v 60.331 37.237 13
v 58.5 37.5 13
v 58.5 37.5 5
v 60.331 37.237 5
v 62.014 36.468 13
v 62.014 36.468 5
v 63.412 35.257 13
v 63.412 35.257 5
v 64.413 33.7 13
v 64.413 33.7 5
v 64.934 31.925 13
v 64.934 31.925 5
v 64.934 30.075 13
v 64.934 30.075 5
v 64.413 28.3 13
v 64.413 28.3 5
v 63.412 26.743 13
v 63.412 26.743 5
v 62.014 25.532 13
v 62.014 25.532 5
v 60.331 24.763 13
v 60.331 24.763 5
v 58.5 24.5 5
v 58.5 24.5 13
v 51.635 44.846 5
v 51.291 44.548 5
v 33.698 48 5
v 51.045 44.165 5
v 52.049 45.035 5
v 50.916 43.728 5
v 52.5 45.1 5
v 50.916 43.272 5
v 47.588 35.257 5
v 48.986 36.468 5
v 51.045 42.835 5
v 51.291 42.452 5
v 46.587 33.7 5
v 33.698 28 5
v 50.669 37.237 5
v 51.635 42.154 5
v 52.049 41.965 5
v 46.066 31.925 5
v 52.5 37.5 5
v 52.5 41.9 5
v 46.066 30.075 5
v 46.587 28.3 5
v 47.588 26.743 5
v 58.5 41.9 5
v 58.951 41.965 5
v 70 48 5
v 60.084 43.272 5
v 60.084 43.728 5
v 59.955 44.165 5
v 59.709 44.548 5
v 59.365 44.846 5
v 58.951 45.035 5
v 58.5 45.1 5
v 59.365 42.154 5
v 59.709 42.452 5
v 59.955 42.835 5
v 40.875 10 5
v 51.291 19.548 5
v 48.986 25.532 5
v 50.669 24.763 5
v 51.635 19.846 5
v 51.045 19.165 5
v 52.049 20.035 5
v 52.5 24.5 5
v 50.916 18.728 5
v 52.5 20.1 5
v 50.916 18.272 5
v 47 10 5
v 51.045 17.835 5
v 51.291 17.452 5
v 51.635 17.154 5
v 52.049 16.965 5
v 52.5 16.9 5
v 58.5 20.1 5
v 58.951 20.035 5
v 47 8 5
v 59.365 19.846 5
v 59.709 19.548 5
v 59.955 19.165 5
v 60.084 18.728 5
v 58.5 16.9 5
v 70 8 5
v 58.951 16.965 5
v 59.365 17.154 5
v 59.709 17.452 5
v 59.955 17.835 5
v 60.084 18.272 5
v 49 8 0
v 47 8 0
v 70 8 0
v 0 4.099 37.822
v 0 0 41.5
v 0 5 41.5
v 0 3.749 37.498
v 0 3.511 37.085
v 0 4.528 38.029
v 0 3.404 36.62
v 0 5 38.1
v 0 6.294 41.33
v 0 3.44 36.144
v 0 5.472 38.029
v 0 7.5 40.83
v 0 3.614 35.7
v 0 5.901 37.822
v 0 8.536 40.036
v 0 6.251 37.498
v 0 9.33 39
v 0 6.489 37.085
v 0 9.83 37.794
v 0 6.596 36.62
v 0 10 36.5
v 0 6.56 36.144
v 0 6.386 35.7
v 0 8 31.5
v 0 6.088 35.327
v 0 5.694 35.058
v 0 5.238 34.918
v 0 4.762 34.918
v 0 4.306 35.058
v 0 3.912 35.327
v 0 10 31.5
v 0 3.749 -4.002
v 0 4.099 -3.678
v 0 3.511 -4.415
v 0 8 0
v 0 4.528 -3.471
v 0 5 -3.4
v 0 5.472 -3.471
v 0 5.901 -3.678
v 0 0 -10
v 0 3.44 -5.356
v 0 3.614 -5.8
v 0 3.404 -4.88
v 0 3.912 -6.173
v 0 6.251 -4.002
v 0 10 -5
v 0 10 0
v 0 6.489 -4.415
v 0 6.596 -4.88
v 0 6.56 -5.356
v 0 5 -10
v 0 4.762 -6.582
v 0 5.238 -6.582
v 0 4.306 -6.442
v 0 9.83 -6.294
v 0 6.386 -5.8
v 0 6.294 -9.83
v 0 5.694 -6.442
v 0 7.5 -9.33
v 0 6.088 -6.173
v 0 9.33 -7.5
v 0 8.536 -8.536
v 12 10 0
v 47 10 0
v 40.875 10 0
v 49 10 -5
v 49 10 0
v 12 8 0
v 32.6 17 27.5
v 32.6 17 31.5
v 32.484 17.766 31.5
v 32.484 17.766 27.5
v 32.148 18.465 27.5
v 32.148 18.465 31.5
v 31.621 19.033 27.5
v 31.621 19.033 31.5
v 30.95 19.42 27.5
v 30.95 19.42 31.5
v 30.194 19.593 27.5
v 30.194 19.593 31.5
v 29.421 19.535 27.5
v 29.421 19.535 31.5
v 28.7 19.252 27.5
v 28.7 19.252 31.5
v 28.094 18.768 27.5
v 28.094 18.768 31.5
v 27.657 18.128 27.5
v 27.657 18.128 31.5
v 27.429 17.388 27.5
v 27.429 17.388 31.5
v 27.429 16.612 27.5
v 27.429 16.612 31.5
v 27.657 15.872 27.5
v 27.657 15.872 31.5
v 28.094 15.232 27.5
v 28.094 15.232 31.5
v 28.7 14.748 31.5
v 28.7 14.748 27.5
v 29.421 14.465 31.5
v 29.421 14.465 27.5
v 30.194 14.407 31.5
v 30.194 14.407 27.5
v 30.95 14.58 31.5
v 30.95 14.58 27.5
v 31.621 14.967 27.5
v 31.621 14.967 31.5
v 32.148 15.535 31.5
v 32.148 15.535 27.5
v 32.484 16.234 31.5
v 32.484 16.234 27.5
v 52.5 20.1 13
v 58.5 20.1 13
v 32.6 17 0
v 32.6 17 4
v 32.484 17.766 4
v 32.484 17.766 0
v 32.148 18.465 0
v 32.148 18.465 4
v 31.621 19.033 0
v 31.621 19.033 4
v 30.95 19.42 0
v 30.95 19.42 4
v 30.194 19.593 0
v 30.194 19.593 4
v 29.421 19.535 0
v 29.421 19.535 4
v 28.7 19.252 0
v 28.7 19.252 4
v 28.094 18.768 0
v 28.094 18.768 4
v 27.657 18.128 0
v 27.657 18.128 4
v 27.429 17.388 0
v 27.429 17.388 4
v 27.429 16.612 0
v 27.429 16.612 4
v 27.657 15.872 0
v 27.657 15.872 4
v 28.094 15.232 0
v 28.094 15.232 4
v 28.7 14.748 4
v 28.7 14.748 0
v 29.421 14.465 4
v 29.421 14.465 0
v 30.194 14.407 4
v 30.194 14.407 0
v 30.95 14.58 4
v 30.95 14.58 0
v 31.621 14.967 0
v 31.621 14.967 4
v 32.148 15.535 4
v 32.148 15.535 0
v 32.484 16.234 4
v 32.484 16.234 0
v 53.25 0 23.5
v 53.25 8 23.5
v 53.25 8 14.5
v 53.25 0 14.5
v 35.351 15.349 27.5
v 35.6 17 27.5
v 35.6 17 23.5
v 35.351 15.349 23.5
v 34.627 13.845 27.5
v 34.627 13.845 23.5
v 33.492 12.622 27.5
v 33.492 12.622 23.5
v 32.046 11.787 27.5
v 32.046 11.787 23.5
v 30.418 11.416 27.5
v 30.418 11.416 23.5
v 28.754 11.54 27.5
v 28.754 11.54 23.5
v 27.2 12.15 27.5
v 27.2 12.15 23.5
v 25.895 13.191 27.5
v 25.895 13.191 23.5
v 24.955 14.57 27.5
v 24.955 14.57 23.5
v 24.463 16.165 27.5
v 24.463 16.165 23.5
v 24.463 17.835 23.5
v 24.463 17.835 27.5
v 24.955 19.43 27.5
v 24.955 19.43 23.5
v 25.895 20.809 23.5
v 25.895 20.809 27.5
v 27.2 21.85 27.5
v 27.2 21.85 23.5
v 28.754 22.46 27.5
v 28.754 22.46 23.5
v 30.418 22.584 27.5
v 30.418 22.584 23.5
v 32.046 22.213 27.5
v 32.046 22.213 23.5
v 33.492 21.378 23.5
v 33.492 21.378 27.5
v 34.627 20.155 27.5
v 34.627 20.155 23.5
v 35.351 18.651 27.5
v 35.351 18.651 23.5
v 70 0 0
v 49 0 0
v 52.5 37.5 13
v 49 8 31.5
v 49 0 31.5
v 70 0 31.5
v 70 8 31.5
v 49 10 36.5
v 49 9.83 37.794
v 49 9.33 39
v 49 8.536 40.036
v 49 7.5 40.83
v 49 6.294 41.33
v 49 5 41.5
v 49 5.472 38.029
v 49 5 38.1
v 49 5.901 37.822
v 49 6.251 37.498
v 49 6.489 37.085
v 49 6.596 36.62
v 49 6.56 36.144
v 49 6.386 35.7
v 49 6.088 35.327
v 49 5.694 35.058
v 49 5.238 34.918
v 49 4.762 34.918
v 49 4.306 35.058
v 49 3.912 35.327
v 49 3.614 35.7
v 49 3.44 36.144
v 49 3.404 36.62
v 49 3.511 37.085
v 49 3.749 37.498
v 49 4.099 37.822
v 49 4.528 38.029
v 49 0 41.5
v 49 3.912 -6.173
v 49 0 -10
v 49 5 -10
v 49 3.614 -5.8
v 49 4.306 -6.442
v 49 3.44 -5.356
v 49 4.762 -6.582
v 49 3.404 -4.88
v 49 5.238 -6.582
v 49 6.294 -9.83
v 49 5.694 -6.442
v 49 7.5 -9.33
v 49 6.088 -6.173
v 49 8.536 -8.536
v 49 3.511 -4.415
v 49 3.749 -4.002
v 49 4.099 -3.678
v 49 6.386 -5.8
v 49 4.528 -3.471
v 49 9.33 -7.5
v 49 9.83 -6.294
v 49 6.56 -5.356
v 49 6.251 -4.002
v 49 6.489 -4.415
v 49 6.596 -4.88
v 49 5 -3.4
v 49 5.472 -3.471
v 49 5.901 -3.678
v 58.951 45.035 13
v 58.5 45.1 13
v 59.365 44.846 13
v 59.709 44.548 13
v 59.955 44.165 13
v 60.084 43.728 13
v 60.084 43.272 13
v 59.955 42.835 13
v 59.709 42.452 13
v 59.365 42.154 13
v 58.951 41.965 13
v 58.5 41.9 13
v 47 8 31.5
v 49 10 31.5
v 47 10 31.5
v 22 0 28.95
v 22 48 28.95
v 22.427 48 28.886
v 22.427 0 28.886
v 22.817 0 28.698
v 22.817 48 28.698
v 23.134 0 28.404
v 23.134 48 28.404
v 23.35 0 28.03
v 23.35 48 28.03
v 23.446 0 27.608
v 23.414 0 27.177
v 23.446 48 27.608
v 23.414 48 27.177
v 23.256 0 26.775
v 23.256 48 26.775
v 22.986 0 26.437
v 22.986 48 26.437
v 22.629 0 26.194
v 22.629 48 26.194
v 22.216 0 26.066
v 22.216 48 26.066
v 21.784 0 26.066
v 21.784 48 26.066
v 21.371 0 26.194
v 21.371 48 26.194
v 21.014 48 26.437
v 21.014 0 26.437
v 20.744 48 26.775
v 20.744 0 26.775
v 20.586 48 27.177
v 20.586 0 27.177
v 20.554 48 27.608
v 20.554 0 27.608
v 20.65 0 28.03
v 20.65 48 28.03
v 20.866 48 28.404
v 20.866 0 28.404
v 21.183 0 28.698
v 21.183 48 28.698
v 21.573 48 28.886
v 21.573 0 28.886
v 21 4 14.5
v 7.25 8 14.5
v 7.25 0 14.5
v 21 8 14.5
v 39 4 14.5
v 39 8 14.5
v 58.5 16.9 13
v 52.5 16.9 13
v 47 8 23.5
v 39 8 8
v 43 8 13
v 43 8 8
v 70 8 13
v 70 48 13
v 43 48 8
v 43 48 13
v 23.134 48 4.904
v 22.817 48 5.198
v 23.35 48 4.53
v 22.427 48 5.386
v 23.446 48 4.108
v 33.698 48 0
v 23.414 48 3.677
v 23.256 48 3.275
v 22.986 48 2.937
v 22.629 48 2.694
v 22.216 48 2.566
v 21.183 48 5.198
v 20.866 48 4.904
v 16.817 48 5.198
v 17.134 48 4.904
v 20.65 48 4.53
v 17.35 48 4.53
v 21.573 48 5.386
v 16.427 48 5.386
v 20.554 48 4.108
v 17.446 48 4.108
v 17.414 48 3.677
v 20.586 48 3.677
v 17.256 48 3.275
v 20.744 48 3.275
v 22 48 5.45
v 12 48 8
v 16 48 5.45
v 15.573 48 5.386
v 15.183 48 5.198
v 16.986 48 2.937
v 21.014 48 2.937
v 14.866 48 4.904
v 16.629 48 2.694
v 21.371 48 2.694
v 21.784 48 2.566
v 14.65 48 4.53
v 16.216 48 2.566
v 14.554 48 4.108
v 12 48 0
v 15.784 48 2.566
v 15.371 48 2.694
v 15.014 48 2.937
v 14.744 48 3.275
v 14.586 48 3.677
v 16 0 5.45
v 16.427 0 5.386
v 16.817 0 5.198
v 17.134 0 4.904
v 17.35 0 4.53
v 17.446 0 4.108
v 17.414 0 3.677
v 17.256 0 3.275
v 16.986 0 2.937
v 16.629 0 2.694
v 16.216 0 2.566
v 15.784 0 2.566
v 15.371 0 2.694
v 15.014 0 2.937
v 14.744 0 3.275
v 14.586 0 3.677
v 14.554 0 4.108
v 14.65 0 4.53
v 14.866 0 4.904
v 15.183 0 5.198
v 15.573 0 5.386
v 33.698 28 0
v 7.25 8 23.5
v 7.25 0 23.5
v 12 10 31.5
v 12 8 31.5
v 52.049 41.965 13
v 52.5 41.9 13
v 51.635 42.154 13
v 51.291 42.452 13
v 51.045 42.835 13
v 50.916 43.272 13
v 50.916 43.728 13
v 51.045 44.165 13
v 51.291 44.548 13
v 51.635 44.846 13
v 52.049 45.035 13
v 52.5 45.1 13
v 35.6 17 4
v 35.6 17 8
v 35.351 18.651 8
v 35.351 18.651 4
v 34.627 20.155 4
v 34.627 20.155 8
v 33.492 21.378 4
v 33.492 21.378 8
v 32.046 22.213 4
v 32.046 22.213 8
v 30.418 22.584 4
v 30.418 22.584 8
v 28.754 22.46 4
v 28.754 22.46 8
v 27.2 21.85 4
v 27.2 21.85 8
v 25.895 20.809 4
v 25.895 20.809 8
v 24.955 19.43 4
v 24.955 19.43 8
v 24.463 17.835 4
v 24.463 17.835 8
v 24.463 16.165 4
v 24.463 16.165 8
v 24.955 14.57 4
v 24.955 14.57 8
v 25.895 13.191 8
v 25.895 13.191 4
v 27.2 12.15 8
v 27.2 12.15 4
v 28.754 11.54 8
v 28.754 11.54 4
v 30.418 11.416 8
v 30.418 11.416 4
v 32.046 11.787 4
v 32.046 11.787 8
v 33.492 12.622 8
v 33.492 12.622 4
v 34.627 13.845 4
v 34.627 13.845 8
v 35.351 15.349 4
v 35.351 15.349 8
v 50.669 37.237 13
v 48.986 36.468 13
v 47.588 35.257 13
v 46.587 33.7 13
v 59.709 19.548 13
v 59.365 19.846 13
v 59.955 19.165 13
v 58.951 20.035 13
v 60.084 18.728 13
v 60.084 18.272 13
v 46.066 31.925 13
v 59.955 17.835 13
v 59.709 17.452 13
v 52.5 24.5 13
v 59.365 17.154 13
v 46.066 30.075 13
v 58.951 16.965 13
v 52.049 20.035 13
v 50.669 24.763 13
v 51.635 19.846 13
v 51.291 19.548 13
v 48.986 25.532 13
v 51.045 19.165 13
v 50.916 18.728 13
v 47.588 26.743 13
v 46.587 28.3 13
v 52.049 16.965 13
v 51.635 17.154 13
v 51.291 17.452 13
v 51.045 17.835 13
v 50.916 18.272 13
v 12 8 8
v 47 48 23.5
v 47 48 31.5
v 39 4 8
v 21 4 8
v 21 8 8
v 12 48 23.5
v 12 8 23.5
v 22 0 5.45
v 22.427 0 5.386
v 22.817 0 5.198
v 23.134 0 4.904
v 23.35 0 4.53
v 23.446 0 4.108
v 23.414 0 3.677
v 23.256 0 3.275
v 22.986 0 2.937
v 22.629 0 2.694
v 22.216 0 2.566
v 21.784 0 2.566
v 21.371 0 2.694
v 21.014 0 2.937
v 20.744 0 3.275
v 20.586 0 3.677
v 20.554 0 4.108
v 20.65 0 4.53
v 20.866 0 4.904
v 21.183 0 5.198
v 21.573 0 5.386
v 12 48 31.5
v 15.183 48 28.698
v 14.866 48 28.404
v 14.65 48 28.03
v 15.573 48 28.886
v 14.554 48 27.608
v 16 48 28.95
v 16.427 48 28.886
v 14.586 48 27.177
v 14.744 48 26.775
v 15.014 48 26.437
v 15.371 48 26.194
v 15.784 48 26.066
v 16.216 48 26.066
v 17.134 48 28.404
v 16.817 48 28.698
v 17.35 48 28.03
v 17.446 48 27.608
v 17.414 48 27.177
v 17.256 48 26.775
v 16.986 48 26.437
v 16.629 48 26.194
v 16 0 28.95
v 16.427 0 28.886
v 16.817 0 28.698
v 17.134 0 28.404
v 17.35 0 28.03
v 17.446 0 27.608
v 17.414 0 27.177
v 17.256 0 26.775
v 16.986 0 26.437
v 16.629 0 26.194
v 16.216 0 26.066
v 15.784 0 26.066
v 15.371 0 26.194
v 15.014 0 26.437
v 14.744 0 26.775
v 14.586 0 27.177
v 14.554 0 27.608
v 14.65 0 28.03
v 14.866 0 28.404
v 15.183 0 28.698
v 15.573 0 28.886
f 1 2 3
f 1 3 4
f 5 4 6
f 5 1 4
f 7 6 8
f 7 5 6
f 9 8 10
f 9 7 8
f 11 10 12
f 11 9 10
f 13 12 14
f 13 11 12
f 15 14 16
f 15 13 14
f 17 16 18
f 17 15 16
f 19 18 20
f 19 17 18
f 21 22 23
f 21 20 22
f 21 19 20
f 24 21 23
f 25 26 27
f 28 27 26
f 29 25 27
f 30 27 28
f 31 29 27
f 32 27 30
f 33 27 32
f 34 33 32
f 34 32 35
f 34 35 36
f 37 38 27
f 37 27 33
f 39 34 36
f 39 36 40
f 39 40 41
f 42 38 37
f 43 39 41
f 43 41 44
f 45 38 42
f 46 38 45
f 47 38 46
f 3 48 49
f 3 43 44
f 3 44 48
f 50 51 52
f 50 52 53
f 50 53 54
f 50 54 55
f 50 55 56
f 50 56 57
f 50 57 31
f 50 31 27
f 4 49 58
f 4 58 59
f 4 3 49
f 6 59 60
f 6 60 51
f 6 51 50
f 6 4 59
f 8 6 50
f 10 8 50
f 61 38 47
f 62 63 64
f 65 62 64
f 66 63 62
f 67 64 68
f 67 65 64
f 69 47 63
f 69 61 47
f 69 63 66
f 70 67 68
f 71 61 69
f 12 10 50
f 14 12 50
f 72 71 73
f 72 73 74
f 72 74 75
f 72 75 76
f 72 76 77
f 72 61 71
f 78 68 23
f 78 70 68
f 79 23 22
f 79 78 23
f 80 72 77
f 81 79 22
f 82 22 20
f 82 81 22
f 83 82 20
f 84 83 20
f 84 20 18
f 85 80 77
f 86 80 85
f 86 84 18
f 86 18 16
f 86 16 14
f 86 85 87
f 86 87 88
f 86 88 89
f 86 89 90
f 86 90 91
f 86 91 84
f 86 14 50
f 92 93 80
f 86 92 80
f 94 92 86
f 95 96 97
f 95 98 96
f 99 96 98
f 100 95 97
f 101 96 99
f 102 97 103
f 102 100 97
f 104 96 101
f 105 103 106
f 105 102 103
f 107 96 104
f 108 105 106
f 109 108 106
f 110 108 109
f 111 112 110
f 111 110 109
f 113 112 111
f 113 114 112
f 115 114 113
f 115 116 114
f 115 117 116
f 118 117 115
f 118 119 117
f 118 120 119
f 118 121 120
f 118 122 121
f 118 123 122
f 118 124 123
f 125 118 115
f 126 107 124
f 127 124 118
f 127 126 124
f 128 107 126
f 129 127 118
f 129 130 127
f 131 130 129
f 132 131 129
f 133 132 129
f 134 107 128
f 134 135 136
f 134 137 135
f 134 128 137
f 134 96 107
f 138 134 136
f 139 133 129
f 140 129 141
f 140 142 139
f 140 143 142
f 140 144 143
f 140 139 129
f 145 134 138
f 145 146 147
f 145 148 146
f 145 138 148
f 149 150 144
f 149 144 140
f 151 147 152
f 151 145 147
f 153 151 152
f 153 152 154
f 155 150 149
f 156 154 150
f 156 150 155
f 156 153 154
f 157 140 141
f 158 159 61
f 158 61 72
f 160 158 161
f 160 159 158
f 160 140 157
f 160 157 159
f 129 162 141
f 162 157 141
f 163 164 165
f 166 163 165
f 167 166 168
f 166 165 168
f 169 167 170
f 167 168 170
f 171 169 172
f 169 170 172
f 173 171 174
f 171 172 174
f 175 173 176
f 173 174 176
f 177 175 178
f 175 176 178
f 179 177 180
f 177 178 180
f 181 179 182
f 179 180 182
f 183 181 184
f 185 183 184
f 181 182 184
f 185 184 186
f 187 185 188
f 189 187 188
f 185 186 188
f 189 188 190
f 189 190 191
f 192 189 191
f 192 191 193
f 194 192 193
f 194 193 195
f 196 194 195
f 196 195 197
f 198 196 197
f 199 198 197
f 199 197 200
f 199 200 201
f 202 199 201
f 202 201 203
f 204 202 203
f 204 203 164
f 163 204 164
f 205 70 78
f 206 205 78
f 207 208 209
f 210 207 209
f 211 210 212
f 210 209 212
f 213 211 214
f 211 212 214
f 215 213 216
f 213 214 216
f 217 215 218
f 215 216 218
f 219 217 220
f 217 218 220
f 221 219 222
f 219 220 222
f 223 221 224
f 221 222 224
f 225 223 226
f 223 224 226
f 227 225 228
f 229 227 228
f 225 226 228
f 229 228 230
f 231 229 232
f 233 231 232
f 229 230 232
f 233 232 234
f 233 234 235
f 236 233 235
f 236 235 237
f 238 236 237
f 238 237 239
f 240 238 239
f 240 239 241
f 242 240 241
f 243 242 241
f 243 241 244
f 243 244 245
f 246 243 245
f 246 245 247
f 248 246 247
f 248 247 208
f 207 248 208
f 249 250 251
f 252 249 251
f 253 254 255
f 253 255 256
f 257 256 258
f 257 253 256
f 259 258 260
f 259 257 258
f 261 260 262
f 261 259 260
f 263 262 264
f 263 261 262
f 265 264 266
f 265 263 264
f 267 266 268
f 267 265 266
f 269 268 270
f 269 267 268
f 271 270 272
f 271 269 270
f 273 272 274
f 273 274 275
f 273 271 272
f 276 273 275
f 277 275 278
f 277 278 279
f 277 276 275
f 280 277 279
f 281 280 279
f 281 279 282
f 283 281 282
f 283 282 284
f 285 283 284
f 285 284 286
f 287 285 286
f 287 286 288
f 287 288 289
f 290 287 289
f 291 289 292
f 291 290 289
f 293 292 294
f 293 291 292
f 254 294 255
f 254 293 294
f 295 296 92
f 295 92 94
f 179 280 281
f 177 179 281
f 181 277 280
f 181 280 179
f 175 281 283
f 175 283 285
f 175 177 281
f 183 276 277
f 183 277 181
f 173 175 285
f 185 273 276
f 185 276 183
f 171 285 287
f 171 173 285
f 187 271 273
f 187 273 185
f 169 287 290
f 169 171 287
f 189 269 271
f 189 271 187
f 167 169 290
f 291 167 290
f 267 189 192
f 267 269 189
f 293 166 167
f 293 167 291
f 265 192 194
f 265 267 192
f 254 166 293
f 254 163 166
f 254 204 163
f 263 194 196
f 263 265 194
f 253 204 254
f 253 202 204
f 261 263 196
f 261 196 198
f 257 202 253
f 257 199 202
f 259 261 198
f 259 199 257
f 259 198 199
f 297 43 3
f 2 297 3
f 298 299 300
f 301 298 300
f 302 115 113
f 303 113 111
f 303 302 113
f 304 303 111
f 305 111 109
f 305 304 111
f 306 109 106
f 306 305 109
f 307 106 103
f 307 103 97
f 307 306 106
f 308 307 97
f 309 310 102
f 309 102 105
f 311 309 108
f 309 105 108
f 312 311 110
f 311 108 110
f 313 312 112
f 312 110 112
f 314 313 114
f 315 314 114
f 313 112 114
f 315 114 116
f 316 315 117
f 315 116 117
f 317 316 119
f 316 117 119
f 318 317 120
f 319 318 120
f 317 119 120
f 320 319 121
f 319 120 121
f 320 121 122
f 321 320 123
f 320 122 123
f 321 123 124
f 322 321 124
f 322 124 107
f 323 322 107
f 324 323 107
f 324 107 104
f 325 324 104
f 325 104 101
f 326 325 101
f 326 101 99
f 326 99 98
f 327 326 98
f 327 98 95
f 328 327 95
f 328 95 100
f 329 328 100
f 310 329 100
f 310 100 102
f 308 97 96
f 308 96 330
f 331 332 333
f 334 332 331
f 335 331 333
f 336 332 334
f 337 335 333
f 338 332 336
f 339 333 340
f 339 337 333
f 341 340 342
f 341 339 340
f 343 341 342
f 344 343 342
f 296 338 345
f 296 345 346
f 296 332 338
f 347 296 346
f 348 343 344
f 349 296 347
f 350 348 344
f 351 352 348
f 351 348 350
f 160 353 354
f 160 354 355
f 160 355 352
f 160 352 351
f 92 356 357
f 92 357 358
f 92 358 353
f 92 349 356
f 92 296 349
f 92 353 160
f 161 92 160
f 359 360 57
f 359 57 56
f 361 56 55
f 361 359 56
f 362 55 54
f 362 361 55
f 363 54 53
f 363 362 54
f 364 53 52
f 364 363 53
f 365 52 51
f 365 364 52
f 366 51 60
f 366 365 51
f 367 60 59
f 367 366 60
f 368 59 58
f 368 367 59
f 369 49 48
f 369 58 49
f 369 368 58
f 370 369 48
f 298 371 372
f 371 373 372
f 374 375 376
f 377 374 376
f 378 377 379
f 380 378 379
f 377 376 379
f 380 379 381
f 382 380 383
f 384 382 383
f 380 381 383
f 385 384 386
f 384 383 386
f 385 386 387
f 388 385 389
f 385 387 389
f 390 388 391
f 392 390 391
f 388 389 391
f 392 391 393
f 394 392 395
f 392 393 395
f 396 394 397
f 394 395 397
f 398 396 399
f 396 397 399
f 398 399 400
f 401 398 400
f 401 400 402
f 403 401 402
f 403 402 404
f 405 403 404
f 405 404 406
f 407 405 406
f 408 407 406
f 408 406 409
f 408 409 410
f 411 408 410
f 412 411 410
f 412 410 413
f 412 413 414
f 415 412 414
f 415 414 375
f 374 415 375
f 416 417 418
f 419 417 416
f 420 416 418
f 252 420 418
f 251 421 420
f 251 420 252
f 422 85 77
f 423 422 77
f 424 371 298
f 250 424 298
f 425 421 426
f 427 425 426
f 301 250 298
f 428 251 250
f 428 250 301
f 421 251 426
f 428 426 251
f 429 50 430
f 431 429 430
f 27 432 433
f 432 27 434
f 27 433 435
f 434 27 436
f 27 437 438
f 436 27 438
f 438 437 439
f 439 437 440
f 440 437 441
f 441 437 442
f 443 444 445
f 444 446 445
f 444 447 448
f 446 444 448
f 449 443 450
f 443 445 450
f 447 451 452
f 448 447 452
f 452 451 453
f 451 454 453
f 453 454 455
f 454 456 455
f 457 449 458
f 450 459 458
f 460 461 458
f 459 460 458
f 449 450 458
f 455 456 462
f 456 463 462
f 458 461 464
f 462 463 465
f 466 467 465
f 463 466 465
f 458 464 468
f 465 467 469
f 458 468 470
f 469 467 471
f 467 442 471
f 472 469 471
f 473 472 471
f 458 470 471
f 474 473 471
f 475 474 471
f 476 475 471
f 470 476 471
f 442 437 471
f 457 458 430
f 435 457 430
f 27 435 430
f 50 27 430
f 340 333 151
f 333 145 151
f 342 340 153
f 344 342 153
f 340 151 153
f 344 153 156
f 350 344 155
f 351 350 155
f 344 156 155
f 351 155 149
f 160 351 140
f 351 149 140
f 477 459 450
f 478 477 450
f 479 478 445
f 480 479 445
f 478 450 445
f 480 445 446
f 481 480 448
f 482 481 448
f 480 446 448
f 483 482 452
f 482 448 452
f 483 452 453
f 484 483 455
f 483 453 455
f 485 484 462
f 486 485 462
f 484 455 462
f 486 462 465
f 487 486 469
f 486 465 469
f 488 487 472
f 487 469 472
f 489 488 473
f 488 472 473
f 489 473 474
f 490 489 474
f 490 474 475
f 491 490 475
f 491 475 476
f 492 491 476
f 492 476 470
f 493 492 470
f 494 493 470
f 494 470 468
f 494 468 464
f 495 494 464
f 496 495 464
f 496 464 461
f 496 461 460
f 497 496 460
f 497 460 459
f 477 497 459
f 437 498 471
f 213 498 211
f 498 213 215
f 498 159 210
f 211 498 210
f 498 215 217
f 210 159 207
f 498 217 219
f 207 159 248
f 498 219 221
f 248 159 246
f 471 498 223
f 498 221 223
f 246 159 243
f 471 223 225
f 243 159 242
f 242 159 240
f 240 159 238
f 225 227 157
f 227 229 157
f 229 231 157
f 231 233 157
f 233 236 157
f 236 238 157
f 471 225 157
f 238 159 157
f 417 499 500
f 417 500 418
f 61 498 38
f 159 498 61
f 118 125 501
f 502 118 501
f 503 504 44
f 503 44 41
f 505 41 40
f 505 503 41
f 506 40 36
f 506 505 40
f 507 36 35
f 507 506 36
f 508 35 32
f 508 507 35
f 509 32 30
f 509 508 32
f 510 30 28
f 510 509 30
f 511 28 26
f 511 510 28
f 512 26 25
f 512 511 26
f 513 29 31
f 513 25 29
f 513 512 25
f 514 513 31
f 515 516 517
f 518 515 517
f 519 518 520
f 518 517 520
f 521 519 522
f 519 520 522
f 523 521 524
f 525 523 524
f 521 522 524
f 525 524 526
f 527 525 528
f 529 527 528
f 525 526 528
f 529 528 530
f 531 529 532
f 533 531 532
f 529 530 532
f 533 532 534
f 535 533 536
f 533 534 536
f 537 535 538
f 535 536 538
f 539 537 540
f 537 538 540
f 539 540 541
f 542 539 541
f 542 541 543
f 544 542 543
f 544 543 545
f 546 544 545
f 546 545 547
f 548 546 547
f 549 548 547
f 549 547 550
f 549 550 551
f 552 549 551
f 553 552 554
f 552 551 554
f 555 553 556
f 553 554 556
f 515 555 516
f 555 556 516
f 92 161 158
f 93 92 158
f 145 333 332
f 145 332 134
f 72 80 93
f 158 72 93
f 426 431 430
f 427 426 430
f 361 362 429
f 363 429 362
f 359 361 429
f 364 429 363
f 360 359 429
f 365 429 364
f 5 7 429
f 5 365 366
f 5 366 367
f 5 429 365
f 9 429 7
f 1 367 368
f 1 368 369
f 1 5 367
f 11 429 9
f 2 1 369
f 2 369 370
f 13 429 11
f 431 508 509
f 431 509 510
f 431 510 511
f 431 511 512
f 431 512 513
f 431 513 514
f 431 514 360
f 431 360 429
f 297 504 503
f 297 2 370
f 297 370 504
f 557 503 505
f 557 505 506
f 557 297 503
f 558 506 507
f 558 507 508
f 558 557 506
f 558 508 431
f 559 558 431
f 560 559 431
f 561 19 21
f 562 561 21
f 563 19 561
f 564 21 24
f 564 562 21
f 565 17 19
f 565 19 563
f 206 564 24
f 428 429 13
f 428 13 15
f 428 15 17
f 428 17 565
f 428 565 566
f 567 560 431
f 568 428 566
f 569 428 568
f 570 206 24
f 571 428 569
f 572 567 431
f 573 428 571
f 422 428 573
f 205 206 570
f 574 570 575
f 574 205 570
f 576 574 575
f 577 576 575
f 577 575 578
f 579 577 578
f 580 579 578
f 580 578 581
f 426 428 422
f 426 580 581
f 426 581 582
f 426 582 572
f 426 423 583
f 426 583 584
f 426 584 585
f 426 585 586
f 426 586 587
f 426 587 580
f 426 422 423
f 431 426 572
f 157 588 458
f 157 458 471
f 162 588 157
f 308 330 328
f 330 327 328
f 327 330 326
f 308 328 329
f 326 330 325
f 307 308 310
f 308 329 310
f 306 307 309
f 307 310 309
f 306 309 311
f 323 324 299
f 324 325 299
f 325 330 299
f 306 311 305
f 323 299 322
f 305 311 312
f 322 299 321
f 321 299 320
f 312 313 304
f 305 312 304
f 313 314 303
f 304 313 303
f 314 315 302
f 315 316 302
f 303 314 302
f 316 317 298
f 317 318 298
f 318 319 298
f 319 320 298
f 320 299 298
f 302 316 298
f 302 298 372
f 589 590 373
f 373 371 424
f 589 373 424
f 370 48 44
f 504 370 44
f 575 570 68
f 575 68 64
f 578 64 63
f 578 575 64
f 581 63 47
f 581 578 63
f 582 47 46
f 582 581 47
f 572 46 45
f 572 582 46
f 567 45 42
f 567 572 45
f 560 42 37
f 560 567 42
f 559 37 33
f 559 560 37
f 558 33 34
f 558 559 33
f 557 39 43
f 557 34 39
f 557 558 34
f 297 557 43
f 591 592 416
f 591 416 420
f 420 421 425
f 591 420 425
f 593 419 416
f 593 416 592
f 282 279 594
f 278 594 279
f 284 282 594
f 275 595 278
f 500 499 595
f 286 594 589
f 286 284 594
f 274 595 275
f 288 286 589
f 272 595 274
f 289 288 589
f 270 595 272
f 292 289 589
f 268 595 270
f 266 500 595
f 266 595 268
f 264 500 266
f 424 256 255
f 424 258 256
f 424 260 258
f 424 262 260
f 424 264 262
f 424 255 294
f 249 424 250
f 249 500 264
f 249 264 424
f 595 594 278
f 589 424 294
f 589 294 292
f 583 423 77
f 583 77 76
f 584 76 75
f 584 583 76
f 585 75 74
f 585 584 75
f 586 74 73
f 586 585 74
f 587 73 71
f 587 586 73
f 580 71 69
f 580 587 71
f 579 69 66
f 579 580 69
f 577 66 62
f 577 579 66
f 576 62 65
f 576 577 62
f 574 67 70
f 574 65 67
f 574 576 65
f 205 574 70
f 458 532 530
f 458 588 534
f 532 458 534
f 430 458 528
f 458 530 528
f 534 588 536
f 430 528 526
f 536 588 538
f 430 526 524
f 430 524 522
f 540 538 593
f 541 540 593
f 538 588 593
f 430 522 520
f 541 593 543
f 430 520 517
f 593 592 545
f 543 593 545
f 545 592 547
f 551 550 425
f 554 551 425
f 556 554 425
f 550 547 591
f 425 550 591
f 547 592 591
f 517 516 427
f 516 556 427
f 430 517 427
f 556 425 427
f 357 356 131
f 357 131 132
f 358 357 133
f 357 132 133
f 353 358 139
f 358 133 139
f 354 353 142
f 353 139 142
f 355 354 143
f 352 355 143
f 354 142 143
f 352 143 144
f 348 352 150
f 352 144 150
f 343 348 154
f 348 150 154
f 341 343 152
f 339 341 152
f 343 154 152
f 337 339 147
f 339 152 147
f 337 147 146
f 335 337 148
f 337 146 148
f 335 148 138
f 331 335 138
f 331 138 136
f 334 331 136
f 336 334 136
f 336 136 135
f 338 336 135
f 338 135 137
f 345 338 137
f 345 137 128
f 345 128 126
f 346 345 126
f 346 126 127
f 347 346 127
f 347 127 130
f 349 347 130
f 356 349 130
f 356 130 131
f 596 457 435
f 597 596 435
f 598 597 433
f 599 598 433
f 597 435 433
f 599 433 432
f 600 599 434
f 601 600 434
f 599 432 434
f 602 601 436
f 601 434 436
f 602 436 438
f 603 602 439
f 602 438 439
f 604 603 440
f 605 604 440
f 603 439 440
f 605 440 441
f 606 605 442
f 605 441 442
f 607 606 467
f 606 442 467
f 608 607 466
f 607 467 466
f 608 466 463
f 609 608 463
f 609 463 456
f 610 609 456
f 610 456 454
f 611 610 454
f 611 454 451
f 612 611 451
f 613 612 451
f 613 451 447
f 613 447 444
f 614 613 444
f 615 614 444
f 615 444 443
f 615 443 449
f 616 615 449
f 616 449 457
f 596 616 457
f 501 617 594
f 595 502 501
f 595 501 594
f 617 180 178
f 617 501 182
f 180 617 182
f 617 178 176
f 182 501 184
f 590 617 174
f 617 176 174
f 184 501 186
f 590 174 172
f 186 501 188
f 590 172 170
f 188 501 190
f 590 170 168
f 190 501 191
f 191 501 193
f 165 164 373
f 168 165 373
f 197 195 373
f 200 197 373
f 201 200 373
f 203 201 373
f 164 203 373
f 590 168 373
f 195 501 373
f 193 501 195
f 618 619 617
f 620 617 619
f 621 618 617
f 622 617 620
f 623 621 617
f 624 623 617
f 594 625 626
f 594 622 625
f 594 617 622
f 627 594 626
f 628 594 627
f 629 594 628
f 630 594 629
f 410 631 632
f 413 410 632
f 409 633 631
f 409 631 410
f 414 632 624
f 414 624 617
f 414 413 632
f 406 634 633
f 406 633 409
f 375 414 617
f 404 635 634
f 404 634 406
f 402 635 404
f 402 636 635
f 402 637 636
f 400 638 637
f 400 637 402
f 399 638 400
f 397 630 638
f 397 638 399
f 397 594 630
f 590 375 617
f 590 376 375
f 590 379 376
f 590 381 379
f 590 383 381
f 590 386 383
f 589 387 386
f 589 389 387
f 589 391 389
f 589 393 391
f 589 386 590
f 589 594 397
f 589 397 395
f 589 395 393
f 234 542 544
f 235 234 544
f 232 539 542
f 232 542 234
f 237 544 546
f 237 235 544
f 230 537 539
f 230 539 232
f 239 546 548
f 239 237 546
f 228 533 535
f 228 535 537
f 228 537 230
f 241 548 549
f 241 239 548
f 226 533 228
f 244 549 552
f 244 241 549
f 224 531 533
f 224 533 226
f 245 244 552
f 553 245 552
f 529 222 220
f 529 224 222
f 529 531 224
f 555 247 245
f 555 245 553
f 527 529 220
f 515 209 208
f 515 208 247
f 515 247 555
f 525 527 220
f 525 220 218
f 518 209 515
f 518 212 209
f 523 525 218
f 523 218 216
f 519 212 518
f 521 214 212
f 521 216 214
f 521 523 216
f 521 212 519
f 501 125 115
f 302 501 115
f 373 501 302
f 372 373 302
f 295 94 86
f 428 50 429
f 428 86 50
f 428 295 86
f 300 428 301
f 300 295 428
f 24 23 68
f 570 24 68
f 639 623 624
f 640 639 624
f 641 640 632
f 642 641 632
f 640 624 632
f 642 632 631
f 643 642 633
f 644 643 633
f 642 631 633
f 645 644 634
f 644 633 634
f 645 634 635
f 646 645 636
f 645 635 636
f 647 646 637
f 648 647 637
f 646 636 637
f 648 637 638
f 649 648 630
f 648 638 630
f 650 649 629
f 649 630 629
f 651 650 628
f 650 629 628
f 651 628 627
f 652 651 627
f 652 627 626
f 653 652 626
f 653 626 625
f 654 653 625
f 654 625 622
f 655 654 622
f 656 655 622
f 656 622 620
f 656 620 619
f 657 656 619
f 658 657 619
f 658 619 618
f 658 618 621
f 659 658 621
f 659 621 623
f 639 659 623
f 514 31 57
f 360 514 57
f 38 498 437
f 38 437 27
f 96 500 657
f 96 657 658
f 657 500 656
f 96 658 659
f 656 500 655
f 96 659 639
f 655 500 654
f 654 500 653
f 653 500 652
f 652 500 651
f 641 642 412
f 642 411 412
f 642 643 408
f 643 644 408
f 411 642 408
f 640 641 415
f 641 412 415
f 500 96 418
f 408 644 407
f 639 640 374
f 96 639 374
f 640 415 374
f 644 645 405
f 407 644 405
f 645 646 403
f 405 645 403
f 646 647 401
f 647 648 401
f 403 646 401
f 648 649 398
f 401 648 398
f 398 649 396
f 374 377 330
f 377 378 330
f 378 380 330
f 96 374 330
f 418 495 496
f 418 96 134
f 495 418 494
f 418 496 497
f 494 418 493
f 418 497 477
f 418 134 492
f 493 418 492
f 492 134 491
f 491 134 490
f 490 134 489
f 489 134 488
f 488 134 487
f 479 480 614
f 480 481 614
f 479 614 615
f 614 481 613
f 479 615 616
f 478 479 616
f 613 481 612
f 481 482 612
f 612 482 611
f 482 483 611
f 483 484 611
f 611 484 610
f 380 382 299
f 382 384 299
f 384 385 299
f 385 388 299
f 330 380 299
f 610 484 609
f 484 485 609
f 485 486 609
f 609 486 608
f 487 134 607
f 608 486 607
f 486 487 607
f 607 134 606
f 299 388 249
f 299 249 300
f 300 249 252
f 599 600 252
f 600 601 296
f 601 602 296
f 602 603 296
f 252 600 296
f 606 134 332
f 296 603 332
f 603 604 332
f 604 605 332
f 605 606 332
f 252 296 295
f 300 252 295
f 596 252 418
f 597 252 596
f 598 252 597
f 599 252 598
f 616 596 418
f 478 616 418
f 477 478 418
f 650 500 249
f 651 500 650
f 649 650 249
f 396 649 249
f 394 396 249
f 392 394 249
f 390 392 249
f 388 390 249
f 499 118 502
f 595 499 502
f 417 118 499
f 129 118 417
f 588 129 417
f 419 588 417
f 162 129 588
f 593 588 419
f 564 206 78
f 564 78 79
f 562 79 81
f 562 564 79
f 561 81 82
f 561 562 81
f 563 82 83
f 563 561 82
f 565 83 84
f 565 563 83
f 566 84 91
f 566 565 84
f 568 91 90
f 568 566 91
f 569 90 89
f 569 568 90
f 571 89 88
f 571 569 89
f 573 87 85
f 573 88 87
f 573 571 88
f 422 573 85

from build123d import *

# Parameters (mm, degrees)
SKETCH1_W           = 70
SKETCH1_H           = 31.5
BOSS_EXTRUDE1_DEPTH = 8
SKETCH2_W           = 35
SKETCH2_H           = 8
BOSS_EXTRUDE2_DEPTH = 20
SKETCH3_R           = 2.6
CUT_EXTRUDE1_DEPTH  = 82.70832271
SKETCH4_W           = 49
SKETCH4_H           = 10
BOSS_EXTRUDE3_DEPTH = 10
SKETCH5_R           = 1.6
CUT_EXTRUDE2_DEPTH  = 82.70832271
SKETCH6_W           = 46
SKETCH6_H           = 9
CUT_EXTRUDE3_DEPTH  = 80.323703897
SKETCH7_R           = 5.6
CUT_EXTRUDE4_DEPTH  = 4
CUT_EXTRUDE5_START  = -4
SKETCH8_R           = 5.6
CUT_EXTRUDE5_DEPTH  = 4
SKETCH9_W           = 18
SKETCH9_H           = 6.5
CUT_EXTRUDE6_DEPTH  = 4
BOSS_EXTRUDE5_DEPTH = 20
CUT_EXTRUDE10_DEPTH = 5
BOSS_EXTRUDE6_DEPTH = 20
CUT_EXTRUDE11_DEPTH = 88.93747779
SKETCH17_W          = 49
SKETCH17_H          = 10
BOSS_EXTRUDE7_DEPTH = 10
SKETCH18_R          = 1.6
CUT_EXTRUDE12_DEPTH = 95.478833608
SKETCH19_W          = 35
SKETCH19_H          = 8
BOSS_EXTRUDE8_DEPTH = 20
SKETCH23_R          = 1.45
CUT_EXTRUDE13_DEPTH = 95.478833608
FILLET1_R           = 5


with BuildPart() as part:
    # Sketch1 → Boss-Extrude1 (new body)
    with BuildSketch(Plane(origin=(0, 0, 0), x_dir=(1, 0, 0), z_dir=(0, 1, 0))):
        with Locations((35, -15.75)):
            Rectangle(SKETCH1_W, SKETCH1_H)
    extrude(amount=BOSS_EXTRUDE1_DEPTH)

    # Sketch2 → Boss-Extrude2 (add)
    with BuildSketch(Plane(origin=(0, 8, 0), x_dir=(1, 0, 0), z_dir=(0, 1, 0))):
        with Locations((29.5, -27.5)):
            Rectangle(SKETCH2_W, SKETCH2_H)
        with Locations((29.5, -4)):
            Rectangle(SKETCH2_W, SKETCH2_H)
    extrude(amount=BOSS_EXTRUDE2_DEPTH)

    # Sketch3 → Cut-Extrude1 (cut, through all)
    with BuildSketch(Plane.XY.offset(31.5)):
        with Locations((30, 17)):
            Circle(SKETCH3_R)
    extrude(amount=-CUT_EXTRUDE1_DEPTH, mode=Mode.SUBTRACT)

    # Sketch4 → Boss-Extrude3 (add)
    with BuildSketch(Plane(origin=(0, 0, 0), x_dir=(-1, 0, 0), z_dir=(0, 0, -1))):
        with Locations((-24.5, 5)):
            Rectangle(SKETCH4_W, SKETCH4_H)
    extrude(amount=BOSS_EXTRUDE3_DEPTH)

    # Sketch5 → Cut-Extrude2 (cut, through all)
    with BuildSketch(Plane.ZY):
        with Locations((-5, 5)):
            Circle(SKETCH5_R)
    extrude(amount=-CUT_EXTRUDE2_DEPTH, mode=Mode.SUBTRACT)

    # Sketch6 → Cut-Extrude3 (cut, through all)
    with BuildSketch(Plane(origin=(0, 8, 0), x_dir=(1, 0, 0), z_dir=(0, 1, 0))):
        with Locations((30.25, -19)):
            Rectangle(SKETCH6_W, SKETCH6_H)
    extrude(amount=-CUT_EXTRUDE3_DEPTH, mode=Mode.SUBTRACT)

    # Sketch7 → Cut-Extrude4 (cut)
    with BuildSketch(Plane.XY.offset(8)):
        with Locations((30, 17)):
            Circle(SKETCH7_R)
    extrude(amount=-CUT_EXTRUDE4_DEPTH, mode=Mode.SUBTRACT)

    # Sketch8 → Cut-Extrude5 (cut)
    with BuildSketch(Plane(origin=(0, 0, 23.5), x_dir=(-1, 0, 0), z_dir=(0, 0, -1)).offset(CUT_EXTRUDE5_START)):
        with Locations(Location((-30, 17, 0), (0, 0, 180))):
            Circle(SKETCH8_R)
    extrude(amount=CUT_EXTRUDE5_DEPTH, mode=Mode.SUBTRACT)

    # Sketch9 → Cut-Extrude6 (cut)
    with BuildSketch(Plane(origin=(0, 8, 0), x_dir=(1, 0, 0), z_dir=(0, 1, 0))):
        with Locations((30, -11.25)):
            Rectangle(SKETCH9_W, SKETCH9_H)
    extrude(amount=-CUT_EXTRUDE6_DEPTH, mode=Mode.SUBTRACT)

    # Sketch13 → Boss-Extrude5 (add)
    with BuildSketch(Plane(origin=(0, 8, 0), x_dir=(1, 0, 0), z_dir=(0, 1, 0))):
        Polygon((70, -13), (43, -13), (43, -8), (47, -8), (47, -5), (70, -5), align=None)
    extrude(amount=BOSS_EXTRUDE5_DEPTH)

    # Sketch14 → Cut-Extrude10 (cut)
    with BuildSketch(Plane(origin=(0, 0, 0), x_dir=(-1, 0, 0), z_dir=(0, 0, -1))):
        Polygon((-33.697877871, 28), (-40.874528252, 10), (-47, 10), (-47, 28), align=None)
    extrude(amount=-CUT_EXTRUDE10_DEPTH, mode=Mode.SUBTRACT)

    # Sketch15 → Boss-Extrude6 (add)
    with BuildSketch(Plane(origin=(0, 28, 0), x_dir=(1, 0, 0), z_dir=(0, 1, 0))):
        Polygon((70, -5), (70, -13), (43, -13), (43, -8), (33.697877871, -8), (24.157827733, -8), (12, -8), (12, 0), (24.157827733, 0), (33.697877871, 0), (33.697877871, -5), align=None)
    extrude(amount=BOSS_EXTRUDE6_DEPTH)

    # Sketch16 → Cut-Extrude11 (cut, through all)
    with BuildSketch(Plane.XY.offset(13)):
        with BuildLine():
            Line((52.5, 37.5), (58.5, 37.5))
            ThreePointArc((58.5, 37.5), (65, 31), (58.5, 24.5))
            Line((58.5, 24.5), (52.5, 24.5))
            ThreePointArc((52.5, 24.5), (46, 31), (52.5, 37.5))
        make_face()
        with BuildLine():
            Line((52.5, 45.1), (58.5, 45.1))
            ThreePointArc((58.5, 45.1), (60.1, 43.5), (58.5, 41.9))
            Line((58.5, 41.9), (52.5, 41.9))
            ThreePointArc((52.5, 41.9), (50.9, 43.5), (52.5, 45.1))
        make_face()
        with BuildLine():
            Line((52.5, 20.1), (58.5, 20.1))
            ThreePointArc((58.5, 20.1), (60.1, 18.5), (58.5, 16.9))
            Line((58.5, 16.9), (52.5, 16.9))
            ThreePointArc((52.5, 16.9), (50.9, 18.5), (52.5, 20.1))
        make_face()
    extrude(amount=-CUT_EXTRUDE11_DEPTH, mode=Mode.SUBTRACT)

    # Sketch17 → Boss-Extrude7 (add)
    with BuildSketch(Plane.XY.offset(31.5)):
        with Locations((24.5, 5)):
            Rectangle(SKETCH17_W, SKETCH17_H)
    extrude(amount=BOSS_EXTRUDE7_DEPTH)

    # Sketch18 → Cut-Extrude12 (cut, through all)
    with BuildSketch(Plane.ZY):
        with Locations((36.5, 5)):
            Circle(SKETCH18_R)
    extrude(amount=-CUT_EXTRUDE12_DEPTH, mode=Mode.SUBTRACT)

    # Sketch19 → Boss-Extrude8 (add)
    with BuildSketch(Plane(origin=(0, 28, 0), x_dir=(1, 0, 0), z_dir=(0, 1, 0))):
        with Locations((29.5, -27.5)):
            Rectangle(SKETCH19_W, SKETCH19_H)
    extrude(amount=BOSS_EXTRUDE8_DEPTH)

    # Sketch23 → Cut-Extrude13 (cut, through all)
    with BuildSketch(Plane(origin=(0, 48, 0), x_dir=(1, 0, 0), z_dir=(0, 1, 0))):
        with Locations(Location((16, -27.5, 0), (0, 0, 270))):
            Circle(SKETCH23_R)
        with Locations(Location((16, -4, 0), (0, 0, 270))):
            Circle(SKETCH23_R)
        with Locations(Location((22, -27.5, 0), (0, 0, 270))):
            Circle(SKETCH23_R)
        with Locations(Location((22, -4, 0), (0, 0, 270))):
            Circle(SKETCH23_R)
    extrude(amount=-CUT_EXTRUDE13_DEPTH, mode=Mode.SUBTRACT)

    # Fillet1
    fillet1_edges = [part.edges().sort_by_distance(p)[0] for p in [
        (24.5, 10, 41.5),
        (24.5, 10, -10),
    ]]
    fillet(fillet1_edges, radius=FILLET1_R)


solid = part.part
